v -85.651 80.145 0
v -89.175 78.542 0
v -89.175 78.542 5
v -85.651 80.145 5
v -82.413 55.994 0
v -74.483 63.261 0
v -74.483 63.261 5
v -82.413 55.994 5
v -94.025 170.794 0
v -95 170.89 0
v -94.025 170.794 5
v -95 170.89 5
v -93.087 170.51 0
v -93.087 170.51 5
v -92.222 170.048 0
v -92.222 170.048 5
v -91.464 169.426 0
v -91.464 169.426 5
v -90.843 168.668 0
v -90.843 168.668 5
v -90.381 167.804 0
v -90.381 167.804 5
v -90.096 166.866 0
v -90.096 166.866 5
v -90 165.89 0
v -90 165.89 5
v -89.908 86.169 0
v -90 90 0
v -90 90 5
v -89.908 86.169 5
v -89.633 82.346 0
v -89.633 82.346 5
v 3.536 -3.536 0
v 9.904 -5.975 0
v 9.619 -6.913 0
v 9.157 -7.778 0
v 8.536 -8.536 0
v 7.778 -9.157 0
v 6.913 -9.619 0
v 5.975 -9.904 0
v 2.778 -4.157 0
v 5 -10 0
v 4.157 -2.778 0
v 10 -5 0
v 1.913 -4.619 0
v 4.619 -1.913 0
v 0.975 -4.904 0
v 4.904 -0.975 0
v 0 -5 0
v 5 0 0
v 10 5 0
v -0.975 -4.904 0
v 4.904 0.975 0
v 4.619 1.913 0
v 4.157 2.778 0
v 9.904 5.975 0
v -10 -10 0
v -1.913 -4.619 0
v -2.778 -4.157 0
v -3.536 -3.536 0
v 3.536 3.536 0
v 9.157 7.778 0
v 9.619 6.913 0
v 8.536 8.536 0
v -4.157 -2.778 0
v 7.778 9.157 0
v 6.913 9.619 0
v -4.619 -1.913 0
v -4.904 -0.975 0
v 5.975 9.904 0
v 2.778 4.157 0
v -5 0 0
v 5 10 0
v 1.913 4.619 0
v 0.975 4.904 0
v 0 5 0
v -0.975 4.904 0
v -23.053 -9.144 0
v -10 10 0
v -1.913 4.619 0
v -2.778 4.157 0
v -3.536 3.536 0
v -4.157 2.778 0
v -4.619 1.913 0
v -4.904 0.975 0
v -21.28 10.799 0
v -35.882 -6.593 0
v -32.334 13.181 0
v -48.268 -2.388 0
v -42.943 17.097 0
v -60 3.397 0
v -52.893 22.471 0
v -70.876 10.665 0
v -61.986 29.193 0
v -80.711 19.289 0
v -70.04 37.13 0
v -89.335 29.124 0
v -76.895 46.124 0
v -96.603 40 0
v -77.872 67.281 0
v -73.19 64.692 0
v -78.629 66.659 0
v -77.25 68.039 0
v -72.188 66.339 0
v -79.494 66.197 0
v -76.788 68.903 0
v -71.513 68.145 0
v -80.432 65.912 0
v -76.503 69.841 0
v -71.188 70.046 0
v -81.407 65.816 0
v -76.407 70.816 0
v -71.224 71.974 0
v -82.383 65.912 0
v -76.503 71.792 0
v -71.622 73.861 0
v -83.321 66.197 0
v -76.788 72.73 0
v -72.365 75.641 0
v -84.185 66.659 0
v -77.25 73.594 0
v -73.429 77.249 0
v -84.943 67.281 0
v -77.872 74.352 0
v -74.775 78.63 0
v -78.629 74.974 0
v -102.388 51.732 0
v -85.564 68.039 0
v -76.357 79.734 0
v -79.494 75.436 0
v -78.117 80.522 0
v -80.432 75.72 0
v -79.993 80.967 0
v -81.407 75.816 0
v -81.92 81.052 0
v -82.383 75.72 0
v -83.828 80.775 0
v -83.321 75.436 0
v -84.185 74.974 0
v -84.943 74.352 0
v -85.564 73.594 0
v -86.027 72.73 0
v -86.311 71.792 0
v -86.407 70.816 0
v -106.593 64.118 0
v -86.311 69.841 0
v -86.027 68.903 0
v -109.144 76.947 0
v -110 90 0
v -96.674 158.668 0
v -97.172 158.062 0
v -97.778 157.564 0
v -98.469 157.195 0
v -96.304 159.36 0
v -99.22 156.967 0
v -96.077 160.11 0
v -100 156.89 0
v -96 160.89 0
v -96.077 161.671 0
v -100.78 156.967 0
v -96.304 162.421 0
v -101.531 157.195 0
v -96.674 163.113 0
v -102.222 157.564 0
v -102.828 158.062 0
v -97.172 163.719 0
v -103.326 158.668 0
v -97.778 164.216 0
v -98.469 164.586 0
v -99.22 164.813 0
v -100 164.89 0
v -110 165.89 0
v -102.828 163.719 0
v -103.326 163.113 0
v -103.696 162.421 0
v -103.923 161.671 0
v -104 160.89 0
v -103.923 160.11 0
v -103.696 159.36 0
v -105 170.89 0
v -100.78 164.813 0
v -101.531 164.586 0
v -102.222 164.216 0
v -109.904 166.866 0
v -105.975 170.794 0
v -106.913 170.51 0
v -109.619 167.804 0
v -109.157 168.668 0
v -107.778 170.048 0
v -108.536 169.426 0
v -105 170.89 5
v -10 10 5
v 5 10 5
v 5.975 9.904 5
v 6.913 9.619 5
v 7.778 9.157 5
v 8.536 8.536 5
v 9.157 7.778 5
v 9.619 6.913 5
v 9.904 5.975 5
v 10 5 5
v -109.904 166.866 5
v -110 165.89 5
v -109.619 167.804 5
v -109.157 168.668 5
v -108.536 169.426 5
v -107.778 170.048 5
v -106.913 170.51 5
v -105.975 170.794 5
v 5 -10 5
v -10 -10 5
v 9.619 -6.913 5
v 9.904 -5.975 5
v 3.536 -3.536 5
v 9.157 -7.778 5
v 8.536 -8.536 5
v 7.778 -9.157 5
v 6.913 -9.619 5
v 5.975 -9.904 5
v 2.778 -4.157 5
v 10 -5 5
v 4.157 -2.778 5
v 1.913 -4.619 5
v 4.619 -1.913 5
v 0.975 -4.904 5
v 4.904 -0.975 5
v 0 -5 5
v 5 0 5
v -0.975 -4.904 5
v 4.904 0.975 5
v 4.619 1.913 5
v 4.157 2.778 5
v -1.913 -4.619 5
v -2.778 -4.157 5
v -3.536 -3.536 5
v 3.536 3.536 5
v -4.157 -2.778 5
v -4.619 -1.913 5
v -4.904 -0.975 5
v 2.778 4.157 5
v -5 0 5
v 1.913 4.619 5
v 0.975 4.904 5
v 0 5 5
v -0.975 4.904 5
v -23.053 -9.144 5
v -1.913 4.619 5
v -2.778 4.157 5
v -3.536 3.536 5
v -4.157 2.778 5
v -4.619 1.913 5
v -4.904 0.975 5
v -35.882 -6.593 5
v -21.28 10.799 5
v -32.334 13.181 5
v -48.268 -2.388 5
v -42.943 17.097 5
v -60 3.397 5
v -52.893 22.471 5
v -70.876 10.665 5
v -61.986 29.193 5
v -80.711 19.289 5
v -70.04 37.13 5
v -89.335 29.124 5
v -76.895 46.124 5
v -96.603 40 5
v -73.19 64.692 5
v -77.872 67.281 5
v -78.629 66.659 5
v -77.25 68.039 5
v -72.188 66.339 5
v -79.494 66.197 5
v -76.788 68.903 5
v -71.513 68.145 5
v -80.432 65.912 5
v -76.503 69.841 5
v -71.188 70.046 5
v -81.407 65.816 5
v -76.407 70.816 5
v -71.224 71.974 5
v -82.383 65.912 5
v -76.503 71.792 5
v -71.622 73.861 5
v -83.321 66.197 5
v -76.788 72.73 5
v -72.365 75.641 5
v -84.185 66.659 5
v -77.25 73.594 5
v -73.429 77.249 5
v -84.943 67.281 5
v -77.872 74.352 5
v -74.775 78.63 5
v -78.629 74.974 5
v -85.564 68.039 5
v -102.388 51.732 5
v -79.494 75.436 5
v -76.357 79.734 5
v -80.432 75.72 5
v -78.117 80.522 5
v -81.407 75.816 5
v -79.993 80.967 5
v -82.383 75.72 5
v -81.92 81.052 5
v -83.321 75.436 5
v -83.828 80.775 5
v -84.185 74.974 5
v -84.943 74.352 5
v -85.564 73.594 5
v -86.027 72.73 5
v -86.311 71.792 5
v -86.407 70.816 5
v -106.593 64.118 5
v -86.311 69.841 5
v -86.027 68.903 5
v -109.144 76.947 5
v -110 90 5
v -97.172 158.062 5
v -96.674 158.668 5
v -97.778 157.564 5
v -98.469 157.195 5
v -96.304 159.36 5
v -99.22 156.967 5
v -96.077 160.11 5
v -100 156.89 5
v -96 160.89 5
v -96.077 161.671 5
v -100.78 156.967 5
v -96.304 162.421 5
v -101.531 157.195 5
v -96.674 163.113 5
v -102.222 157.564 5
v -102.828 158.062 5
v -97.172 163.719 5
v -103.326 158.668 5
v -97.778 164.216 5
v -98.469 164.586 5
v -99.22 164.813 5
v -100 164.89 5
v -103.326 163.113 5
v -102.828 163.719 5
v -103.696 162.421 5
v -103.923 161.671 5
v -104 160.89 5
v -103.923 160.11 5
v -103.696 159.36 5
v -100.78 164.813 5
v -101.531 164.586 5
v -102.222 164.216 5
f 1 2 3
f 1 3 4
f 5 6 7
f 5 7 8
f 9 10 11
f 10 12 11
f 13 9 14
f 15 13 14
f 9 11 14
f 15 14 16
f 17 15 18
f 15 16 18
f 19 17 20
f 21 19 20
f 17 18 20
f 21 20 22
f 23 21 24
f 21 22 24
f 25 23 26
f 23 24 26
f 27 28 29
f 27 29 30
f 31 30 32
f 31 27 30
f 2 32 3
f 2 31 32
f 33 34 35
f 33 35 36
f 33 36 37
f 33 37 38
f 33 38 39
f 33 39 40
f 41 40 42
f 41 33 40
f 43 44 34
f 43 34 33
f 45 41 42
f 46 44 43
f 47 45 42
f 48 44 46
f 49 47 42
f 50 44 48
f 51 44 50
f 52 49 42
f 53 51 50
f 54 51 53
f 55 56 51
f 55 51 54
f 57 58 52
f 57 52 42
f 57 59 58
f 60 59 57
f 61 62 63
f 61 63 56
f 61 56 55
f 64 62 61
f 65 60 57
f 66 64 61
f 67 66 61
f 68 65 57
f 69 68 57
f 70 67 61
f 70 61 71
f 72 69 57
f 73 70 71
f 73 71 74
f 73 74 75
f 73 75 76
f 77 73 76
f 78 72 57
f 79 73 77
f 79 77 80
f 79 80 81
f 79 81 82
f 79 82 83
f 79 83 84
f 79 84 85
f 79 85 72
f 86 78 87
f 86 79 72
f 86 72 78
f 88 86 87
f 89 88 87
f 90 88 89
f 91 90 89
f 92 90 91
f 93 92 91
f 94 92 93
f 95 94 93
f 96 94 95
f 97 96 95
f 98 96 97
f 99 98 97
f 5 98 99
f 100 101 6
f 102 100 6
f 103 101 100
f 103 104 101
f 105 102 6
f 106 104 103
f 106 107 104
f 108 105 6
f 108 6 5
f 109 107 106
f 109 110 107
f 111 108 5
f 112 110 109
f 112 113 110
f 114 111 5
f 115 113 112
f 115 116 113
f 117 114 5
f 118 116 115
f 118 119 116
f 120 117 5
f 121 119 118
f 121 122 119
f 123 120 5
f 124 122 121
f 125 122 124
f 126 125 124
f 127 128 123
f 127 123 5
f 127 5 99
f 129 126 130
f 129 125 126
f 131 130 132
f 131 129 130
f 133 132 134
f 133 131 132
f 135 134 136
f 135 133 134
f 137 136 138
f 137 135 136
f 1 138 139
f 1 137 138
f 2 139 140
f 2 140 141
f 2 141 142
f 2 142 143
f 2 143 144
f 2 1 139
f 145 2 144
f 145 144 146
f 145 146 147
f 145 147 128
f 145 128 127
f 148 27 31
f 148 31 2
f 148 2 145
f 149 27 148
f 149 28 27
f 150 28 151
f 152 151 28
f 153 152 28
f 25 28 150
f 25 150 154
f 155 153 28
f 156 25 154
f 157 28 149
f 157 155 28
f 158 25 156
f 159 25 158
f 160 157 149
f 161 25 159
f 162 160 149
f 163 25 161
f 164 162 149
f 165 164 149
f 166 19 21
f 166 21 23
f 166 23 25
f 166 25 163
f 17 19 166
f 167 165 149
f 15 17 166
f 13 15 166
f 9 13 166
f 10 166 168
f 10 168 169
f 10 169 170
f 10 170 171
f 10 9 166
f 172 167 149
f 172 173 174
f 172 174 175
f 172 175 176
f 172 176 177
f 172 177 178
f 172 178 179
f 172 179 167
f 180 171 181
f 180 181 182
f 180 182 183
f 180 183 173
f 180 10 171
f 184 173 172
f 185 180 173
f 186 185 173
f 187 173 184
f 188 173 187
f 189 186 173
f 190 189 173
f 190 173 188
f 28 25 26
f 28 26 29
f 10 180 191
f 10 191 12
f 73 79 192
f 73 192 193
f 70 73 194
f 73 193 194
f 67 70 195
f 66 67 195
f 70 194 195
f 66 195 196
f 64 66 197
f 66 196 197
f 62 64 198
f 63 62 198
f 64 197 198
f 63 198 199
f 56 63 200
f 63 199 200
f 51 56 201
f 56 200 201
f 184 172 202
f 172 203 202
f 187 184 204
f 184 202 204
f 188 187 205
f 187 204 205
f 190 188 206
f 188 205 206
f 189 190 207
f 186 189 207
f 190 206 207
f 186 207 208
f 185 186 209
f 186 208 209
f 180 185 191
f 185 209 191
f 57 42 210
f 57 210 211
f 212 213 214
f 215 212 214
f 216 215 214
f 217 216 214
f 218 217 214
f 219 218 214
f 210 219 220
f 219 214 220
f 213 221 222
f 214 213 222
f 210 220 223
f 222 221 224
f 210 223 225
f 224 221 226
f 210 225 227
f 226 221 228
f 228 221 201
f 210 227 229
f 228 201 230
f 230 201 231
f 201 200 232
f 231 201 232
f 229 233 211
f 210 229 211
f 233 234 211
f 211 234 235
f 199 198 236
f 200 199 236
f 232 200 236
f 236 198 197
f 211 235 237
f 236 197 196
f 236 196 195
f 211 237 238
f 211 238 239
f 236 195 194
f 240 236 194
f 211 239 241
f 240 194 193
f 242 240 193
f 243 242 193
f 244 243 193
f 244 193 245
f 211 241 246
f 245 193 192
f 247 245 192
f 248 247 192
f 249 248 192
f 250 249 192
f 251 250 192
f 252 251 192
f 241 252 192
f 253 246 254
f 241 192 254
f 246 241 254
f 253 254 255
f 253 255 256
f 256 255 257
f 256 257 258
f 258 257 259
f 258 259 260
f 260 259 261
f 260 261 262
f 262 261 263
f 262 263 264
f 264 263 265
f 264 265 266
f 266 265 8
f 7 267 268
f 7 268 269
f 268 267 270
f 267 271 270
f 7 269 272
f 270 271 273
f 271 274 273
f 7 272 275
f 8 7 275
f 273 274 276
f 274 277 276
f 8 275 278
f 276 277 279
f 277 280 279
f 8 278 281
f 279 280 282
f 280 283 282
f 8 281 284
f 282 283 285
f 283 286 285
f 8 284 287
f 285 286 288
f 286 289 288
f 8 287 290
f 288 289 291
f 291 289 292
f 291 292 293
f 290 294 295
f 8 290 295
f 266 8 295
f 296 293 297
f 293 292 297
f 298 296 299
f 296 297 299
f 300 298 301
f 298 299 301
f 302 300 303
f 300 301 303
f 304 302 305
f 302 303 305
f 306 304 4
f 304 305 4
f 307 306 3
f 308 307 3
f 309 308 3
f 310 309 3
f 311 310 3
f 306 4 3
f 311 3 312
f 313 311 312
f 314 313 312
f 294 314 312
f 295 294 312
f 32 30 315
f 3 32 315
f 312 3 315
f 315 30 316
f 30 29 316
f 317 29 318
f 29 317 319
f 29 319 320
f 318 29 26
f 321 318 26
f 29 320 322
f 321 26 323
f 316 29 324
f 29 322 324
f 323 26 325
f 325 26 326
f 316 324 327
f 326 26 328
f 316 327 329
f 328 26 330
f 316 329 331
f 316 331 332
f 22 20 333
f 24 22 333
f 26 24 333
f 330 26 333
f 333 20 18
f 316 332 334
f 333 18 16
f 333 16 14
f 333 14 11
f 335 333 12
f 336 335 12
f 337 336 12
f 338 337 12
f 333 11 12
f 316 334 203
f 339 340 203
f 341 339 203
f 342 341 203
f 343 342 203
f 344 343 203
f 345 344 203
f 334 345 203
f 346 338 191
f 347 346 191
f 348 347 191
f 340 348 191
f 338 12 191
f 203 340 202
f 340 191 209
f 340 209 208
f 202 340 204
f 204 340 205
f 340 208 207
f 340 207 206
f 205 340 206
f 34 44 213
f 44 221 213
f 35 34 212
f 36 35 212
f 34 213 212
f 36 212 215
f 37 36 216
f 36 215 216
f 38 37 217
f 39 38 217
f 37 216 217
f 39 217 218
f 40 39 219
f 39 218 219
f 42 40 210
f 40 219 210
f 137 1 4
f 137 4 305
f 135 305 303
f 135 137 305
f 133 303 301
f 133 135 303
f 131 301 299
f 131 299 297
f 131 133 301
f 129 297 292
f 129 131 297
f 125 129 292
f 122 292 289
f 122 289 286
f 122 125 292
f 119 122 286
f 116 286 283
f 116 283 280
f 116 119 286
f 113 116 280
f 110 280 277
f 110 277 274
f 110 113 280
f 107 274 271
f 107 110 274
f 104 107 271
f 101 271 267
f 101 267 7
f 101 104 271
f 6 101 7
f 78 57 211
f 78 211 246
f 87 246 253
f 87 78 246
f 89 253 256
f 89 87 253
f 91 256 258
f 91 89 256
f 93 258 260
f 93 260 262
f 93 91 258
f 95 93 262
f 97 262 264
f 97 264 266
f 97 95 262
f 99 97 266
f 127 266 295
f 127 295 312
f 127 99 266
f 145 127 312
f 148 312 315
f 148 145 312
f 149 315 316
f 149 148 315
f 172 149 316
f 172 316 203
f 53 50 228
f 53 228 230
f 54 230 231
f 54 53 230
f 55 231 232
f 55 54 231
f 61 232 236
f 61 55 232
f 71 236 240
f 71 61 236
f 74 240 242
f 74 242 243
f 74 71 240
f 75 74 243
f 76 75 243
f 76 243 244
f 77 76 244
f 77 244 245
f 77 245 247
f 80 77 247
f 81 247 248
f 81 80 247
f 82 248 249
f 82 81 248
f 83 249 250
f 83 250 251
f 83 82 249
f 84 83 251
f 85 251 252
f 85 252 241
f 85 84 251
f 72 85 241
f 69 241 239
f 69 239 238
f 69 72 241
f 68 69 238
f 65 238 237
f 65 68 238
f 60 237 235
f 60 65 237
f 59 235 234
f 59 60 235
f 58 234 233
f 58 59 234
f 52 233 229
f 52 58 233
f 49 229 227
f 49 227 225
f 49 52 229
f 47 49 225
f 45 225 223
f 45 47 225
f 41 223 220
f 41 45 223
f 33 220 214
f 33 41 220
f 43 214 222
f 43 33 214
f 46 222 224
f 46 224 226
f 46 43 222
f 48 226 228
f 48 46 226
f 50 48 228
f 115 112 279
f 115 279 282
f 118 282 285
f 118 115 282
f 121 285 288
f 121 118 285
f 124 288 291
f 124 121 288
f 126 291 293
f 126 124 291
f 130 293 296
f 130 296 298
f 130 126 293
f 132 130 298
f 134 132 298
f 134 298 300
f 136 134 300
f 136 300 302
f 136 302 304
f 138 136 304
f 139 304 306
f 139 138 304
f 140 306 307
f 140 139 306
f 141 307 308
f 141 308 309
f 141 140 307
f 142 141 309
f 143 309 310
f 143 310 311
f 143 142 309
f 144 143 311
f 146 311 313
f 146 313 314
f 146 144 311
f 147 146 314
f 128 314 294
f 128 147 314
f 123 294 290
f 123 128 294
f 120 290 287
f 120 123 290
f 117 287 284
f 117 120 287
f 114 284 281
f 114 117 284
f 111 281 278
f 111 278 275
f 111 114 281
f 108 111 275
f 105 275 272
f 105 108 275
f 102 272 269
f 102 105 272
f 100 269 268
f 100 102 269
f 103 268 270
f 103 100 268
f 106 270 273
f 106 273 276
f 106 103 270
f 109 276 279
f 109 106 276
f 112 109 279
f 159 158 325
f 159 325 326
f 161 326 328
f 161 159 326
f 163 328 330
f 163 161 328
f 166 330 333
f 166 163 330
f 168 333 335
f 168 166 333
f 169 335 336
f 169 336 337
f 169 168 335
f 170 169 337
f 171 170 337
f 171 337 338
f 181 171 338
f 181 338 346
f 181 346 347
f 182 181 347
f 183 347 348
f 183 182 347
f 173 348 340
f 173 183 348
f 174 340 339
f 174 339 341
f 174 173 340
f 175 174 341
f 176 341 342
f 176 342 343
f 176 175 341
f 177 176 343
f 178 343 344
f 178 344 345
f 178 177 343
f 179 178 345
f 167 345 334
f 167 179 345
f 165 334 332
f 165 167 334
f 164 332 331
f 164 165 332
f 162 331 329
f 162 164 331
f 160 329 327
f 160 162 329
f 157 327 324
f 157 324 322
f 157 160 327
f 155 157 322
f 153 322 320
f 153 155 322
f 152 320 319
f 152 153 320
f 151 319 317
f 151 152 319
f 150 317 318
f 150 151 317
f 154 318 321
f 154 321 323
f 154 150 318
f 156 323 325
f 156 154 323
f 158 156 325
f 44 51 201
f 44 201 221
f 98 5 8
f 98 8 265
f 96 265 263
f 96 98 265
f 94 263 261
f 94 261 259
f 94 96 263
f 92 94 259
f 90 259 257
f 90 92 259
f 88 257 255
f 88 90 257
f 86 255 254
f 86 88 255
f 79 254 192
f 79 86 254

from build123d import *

# Parameters (mm, degrees)
SKETCH1_R           = 5
SKETCH1_R_2         = 4
BOSS_EXTRUDE1_DEPTH = 5
FILLET3_R           = 5


with BuildPart() as part:
    # Sketch1 → Boss-Extrude1 (new body)
    with BuildSketch(Plane.XY):
        with BuildLine():
            Line((-10, 10), (10, 10))
            Line((10, 10), (10, -10))
            Line((10, -10), (-10, -10))
            ThreePointArc((-10, -10), (-80.710678119, 19.289321881), (-110, 90))
            Line((-110, 90), (-110, 170.890270731))
            Line((-110, 170.890270731), (-90, 170.890270731))
            Line((-90, 170.890270731), (-90, 90))
            ThreePointArc((-90, 90), (-89.793525108, 84.256016114), (-89.175166228, 78.541681939))
            Line((-89.175166228, 78.541681939), (-85.65069666, 80.144960069))
            ThreePointArc((-85.65069666, 80.144960069), (-72.859285644, 76.470042175), (-74.483275307, 63.260656311))
            Line((-74.483275307, 63.260656311), (-82.412785145, 55.994286547))
            ThreePointArc((-82.412785145, 55.994286547), (-52.892557185, 22.470535778), (-10, 10))
        make_face()
        Circle(SKETCH1_R, mode=Mode.SUBTRACT)
        with Locations((-100, 160.890270731)):
            Circle(SKETCH1_R_2, mode=Mode.SUBTRACT)
        with Locations((-81.407148813, 70.816413156)):
            Circle(SKETCH1_R, mode=Mode.SUBTRACT)
    extrude(amount=BOSS_EXTRUDE1_DEPTH)

    # Fillet3
    fillet3_edges = [part.edges().sort_by_distance(p)[0] for p in [
        (10, -10, 2.5),
        (-110, 170.890270731, 2.5),
        (-90, 170.890270731, 2.5),
        (10, 10, 2.5),
    ]]
    fillet(fillet3_edges, radius=FILLET3_R)


solid = part.part
